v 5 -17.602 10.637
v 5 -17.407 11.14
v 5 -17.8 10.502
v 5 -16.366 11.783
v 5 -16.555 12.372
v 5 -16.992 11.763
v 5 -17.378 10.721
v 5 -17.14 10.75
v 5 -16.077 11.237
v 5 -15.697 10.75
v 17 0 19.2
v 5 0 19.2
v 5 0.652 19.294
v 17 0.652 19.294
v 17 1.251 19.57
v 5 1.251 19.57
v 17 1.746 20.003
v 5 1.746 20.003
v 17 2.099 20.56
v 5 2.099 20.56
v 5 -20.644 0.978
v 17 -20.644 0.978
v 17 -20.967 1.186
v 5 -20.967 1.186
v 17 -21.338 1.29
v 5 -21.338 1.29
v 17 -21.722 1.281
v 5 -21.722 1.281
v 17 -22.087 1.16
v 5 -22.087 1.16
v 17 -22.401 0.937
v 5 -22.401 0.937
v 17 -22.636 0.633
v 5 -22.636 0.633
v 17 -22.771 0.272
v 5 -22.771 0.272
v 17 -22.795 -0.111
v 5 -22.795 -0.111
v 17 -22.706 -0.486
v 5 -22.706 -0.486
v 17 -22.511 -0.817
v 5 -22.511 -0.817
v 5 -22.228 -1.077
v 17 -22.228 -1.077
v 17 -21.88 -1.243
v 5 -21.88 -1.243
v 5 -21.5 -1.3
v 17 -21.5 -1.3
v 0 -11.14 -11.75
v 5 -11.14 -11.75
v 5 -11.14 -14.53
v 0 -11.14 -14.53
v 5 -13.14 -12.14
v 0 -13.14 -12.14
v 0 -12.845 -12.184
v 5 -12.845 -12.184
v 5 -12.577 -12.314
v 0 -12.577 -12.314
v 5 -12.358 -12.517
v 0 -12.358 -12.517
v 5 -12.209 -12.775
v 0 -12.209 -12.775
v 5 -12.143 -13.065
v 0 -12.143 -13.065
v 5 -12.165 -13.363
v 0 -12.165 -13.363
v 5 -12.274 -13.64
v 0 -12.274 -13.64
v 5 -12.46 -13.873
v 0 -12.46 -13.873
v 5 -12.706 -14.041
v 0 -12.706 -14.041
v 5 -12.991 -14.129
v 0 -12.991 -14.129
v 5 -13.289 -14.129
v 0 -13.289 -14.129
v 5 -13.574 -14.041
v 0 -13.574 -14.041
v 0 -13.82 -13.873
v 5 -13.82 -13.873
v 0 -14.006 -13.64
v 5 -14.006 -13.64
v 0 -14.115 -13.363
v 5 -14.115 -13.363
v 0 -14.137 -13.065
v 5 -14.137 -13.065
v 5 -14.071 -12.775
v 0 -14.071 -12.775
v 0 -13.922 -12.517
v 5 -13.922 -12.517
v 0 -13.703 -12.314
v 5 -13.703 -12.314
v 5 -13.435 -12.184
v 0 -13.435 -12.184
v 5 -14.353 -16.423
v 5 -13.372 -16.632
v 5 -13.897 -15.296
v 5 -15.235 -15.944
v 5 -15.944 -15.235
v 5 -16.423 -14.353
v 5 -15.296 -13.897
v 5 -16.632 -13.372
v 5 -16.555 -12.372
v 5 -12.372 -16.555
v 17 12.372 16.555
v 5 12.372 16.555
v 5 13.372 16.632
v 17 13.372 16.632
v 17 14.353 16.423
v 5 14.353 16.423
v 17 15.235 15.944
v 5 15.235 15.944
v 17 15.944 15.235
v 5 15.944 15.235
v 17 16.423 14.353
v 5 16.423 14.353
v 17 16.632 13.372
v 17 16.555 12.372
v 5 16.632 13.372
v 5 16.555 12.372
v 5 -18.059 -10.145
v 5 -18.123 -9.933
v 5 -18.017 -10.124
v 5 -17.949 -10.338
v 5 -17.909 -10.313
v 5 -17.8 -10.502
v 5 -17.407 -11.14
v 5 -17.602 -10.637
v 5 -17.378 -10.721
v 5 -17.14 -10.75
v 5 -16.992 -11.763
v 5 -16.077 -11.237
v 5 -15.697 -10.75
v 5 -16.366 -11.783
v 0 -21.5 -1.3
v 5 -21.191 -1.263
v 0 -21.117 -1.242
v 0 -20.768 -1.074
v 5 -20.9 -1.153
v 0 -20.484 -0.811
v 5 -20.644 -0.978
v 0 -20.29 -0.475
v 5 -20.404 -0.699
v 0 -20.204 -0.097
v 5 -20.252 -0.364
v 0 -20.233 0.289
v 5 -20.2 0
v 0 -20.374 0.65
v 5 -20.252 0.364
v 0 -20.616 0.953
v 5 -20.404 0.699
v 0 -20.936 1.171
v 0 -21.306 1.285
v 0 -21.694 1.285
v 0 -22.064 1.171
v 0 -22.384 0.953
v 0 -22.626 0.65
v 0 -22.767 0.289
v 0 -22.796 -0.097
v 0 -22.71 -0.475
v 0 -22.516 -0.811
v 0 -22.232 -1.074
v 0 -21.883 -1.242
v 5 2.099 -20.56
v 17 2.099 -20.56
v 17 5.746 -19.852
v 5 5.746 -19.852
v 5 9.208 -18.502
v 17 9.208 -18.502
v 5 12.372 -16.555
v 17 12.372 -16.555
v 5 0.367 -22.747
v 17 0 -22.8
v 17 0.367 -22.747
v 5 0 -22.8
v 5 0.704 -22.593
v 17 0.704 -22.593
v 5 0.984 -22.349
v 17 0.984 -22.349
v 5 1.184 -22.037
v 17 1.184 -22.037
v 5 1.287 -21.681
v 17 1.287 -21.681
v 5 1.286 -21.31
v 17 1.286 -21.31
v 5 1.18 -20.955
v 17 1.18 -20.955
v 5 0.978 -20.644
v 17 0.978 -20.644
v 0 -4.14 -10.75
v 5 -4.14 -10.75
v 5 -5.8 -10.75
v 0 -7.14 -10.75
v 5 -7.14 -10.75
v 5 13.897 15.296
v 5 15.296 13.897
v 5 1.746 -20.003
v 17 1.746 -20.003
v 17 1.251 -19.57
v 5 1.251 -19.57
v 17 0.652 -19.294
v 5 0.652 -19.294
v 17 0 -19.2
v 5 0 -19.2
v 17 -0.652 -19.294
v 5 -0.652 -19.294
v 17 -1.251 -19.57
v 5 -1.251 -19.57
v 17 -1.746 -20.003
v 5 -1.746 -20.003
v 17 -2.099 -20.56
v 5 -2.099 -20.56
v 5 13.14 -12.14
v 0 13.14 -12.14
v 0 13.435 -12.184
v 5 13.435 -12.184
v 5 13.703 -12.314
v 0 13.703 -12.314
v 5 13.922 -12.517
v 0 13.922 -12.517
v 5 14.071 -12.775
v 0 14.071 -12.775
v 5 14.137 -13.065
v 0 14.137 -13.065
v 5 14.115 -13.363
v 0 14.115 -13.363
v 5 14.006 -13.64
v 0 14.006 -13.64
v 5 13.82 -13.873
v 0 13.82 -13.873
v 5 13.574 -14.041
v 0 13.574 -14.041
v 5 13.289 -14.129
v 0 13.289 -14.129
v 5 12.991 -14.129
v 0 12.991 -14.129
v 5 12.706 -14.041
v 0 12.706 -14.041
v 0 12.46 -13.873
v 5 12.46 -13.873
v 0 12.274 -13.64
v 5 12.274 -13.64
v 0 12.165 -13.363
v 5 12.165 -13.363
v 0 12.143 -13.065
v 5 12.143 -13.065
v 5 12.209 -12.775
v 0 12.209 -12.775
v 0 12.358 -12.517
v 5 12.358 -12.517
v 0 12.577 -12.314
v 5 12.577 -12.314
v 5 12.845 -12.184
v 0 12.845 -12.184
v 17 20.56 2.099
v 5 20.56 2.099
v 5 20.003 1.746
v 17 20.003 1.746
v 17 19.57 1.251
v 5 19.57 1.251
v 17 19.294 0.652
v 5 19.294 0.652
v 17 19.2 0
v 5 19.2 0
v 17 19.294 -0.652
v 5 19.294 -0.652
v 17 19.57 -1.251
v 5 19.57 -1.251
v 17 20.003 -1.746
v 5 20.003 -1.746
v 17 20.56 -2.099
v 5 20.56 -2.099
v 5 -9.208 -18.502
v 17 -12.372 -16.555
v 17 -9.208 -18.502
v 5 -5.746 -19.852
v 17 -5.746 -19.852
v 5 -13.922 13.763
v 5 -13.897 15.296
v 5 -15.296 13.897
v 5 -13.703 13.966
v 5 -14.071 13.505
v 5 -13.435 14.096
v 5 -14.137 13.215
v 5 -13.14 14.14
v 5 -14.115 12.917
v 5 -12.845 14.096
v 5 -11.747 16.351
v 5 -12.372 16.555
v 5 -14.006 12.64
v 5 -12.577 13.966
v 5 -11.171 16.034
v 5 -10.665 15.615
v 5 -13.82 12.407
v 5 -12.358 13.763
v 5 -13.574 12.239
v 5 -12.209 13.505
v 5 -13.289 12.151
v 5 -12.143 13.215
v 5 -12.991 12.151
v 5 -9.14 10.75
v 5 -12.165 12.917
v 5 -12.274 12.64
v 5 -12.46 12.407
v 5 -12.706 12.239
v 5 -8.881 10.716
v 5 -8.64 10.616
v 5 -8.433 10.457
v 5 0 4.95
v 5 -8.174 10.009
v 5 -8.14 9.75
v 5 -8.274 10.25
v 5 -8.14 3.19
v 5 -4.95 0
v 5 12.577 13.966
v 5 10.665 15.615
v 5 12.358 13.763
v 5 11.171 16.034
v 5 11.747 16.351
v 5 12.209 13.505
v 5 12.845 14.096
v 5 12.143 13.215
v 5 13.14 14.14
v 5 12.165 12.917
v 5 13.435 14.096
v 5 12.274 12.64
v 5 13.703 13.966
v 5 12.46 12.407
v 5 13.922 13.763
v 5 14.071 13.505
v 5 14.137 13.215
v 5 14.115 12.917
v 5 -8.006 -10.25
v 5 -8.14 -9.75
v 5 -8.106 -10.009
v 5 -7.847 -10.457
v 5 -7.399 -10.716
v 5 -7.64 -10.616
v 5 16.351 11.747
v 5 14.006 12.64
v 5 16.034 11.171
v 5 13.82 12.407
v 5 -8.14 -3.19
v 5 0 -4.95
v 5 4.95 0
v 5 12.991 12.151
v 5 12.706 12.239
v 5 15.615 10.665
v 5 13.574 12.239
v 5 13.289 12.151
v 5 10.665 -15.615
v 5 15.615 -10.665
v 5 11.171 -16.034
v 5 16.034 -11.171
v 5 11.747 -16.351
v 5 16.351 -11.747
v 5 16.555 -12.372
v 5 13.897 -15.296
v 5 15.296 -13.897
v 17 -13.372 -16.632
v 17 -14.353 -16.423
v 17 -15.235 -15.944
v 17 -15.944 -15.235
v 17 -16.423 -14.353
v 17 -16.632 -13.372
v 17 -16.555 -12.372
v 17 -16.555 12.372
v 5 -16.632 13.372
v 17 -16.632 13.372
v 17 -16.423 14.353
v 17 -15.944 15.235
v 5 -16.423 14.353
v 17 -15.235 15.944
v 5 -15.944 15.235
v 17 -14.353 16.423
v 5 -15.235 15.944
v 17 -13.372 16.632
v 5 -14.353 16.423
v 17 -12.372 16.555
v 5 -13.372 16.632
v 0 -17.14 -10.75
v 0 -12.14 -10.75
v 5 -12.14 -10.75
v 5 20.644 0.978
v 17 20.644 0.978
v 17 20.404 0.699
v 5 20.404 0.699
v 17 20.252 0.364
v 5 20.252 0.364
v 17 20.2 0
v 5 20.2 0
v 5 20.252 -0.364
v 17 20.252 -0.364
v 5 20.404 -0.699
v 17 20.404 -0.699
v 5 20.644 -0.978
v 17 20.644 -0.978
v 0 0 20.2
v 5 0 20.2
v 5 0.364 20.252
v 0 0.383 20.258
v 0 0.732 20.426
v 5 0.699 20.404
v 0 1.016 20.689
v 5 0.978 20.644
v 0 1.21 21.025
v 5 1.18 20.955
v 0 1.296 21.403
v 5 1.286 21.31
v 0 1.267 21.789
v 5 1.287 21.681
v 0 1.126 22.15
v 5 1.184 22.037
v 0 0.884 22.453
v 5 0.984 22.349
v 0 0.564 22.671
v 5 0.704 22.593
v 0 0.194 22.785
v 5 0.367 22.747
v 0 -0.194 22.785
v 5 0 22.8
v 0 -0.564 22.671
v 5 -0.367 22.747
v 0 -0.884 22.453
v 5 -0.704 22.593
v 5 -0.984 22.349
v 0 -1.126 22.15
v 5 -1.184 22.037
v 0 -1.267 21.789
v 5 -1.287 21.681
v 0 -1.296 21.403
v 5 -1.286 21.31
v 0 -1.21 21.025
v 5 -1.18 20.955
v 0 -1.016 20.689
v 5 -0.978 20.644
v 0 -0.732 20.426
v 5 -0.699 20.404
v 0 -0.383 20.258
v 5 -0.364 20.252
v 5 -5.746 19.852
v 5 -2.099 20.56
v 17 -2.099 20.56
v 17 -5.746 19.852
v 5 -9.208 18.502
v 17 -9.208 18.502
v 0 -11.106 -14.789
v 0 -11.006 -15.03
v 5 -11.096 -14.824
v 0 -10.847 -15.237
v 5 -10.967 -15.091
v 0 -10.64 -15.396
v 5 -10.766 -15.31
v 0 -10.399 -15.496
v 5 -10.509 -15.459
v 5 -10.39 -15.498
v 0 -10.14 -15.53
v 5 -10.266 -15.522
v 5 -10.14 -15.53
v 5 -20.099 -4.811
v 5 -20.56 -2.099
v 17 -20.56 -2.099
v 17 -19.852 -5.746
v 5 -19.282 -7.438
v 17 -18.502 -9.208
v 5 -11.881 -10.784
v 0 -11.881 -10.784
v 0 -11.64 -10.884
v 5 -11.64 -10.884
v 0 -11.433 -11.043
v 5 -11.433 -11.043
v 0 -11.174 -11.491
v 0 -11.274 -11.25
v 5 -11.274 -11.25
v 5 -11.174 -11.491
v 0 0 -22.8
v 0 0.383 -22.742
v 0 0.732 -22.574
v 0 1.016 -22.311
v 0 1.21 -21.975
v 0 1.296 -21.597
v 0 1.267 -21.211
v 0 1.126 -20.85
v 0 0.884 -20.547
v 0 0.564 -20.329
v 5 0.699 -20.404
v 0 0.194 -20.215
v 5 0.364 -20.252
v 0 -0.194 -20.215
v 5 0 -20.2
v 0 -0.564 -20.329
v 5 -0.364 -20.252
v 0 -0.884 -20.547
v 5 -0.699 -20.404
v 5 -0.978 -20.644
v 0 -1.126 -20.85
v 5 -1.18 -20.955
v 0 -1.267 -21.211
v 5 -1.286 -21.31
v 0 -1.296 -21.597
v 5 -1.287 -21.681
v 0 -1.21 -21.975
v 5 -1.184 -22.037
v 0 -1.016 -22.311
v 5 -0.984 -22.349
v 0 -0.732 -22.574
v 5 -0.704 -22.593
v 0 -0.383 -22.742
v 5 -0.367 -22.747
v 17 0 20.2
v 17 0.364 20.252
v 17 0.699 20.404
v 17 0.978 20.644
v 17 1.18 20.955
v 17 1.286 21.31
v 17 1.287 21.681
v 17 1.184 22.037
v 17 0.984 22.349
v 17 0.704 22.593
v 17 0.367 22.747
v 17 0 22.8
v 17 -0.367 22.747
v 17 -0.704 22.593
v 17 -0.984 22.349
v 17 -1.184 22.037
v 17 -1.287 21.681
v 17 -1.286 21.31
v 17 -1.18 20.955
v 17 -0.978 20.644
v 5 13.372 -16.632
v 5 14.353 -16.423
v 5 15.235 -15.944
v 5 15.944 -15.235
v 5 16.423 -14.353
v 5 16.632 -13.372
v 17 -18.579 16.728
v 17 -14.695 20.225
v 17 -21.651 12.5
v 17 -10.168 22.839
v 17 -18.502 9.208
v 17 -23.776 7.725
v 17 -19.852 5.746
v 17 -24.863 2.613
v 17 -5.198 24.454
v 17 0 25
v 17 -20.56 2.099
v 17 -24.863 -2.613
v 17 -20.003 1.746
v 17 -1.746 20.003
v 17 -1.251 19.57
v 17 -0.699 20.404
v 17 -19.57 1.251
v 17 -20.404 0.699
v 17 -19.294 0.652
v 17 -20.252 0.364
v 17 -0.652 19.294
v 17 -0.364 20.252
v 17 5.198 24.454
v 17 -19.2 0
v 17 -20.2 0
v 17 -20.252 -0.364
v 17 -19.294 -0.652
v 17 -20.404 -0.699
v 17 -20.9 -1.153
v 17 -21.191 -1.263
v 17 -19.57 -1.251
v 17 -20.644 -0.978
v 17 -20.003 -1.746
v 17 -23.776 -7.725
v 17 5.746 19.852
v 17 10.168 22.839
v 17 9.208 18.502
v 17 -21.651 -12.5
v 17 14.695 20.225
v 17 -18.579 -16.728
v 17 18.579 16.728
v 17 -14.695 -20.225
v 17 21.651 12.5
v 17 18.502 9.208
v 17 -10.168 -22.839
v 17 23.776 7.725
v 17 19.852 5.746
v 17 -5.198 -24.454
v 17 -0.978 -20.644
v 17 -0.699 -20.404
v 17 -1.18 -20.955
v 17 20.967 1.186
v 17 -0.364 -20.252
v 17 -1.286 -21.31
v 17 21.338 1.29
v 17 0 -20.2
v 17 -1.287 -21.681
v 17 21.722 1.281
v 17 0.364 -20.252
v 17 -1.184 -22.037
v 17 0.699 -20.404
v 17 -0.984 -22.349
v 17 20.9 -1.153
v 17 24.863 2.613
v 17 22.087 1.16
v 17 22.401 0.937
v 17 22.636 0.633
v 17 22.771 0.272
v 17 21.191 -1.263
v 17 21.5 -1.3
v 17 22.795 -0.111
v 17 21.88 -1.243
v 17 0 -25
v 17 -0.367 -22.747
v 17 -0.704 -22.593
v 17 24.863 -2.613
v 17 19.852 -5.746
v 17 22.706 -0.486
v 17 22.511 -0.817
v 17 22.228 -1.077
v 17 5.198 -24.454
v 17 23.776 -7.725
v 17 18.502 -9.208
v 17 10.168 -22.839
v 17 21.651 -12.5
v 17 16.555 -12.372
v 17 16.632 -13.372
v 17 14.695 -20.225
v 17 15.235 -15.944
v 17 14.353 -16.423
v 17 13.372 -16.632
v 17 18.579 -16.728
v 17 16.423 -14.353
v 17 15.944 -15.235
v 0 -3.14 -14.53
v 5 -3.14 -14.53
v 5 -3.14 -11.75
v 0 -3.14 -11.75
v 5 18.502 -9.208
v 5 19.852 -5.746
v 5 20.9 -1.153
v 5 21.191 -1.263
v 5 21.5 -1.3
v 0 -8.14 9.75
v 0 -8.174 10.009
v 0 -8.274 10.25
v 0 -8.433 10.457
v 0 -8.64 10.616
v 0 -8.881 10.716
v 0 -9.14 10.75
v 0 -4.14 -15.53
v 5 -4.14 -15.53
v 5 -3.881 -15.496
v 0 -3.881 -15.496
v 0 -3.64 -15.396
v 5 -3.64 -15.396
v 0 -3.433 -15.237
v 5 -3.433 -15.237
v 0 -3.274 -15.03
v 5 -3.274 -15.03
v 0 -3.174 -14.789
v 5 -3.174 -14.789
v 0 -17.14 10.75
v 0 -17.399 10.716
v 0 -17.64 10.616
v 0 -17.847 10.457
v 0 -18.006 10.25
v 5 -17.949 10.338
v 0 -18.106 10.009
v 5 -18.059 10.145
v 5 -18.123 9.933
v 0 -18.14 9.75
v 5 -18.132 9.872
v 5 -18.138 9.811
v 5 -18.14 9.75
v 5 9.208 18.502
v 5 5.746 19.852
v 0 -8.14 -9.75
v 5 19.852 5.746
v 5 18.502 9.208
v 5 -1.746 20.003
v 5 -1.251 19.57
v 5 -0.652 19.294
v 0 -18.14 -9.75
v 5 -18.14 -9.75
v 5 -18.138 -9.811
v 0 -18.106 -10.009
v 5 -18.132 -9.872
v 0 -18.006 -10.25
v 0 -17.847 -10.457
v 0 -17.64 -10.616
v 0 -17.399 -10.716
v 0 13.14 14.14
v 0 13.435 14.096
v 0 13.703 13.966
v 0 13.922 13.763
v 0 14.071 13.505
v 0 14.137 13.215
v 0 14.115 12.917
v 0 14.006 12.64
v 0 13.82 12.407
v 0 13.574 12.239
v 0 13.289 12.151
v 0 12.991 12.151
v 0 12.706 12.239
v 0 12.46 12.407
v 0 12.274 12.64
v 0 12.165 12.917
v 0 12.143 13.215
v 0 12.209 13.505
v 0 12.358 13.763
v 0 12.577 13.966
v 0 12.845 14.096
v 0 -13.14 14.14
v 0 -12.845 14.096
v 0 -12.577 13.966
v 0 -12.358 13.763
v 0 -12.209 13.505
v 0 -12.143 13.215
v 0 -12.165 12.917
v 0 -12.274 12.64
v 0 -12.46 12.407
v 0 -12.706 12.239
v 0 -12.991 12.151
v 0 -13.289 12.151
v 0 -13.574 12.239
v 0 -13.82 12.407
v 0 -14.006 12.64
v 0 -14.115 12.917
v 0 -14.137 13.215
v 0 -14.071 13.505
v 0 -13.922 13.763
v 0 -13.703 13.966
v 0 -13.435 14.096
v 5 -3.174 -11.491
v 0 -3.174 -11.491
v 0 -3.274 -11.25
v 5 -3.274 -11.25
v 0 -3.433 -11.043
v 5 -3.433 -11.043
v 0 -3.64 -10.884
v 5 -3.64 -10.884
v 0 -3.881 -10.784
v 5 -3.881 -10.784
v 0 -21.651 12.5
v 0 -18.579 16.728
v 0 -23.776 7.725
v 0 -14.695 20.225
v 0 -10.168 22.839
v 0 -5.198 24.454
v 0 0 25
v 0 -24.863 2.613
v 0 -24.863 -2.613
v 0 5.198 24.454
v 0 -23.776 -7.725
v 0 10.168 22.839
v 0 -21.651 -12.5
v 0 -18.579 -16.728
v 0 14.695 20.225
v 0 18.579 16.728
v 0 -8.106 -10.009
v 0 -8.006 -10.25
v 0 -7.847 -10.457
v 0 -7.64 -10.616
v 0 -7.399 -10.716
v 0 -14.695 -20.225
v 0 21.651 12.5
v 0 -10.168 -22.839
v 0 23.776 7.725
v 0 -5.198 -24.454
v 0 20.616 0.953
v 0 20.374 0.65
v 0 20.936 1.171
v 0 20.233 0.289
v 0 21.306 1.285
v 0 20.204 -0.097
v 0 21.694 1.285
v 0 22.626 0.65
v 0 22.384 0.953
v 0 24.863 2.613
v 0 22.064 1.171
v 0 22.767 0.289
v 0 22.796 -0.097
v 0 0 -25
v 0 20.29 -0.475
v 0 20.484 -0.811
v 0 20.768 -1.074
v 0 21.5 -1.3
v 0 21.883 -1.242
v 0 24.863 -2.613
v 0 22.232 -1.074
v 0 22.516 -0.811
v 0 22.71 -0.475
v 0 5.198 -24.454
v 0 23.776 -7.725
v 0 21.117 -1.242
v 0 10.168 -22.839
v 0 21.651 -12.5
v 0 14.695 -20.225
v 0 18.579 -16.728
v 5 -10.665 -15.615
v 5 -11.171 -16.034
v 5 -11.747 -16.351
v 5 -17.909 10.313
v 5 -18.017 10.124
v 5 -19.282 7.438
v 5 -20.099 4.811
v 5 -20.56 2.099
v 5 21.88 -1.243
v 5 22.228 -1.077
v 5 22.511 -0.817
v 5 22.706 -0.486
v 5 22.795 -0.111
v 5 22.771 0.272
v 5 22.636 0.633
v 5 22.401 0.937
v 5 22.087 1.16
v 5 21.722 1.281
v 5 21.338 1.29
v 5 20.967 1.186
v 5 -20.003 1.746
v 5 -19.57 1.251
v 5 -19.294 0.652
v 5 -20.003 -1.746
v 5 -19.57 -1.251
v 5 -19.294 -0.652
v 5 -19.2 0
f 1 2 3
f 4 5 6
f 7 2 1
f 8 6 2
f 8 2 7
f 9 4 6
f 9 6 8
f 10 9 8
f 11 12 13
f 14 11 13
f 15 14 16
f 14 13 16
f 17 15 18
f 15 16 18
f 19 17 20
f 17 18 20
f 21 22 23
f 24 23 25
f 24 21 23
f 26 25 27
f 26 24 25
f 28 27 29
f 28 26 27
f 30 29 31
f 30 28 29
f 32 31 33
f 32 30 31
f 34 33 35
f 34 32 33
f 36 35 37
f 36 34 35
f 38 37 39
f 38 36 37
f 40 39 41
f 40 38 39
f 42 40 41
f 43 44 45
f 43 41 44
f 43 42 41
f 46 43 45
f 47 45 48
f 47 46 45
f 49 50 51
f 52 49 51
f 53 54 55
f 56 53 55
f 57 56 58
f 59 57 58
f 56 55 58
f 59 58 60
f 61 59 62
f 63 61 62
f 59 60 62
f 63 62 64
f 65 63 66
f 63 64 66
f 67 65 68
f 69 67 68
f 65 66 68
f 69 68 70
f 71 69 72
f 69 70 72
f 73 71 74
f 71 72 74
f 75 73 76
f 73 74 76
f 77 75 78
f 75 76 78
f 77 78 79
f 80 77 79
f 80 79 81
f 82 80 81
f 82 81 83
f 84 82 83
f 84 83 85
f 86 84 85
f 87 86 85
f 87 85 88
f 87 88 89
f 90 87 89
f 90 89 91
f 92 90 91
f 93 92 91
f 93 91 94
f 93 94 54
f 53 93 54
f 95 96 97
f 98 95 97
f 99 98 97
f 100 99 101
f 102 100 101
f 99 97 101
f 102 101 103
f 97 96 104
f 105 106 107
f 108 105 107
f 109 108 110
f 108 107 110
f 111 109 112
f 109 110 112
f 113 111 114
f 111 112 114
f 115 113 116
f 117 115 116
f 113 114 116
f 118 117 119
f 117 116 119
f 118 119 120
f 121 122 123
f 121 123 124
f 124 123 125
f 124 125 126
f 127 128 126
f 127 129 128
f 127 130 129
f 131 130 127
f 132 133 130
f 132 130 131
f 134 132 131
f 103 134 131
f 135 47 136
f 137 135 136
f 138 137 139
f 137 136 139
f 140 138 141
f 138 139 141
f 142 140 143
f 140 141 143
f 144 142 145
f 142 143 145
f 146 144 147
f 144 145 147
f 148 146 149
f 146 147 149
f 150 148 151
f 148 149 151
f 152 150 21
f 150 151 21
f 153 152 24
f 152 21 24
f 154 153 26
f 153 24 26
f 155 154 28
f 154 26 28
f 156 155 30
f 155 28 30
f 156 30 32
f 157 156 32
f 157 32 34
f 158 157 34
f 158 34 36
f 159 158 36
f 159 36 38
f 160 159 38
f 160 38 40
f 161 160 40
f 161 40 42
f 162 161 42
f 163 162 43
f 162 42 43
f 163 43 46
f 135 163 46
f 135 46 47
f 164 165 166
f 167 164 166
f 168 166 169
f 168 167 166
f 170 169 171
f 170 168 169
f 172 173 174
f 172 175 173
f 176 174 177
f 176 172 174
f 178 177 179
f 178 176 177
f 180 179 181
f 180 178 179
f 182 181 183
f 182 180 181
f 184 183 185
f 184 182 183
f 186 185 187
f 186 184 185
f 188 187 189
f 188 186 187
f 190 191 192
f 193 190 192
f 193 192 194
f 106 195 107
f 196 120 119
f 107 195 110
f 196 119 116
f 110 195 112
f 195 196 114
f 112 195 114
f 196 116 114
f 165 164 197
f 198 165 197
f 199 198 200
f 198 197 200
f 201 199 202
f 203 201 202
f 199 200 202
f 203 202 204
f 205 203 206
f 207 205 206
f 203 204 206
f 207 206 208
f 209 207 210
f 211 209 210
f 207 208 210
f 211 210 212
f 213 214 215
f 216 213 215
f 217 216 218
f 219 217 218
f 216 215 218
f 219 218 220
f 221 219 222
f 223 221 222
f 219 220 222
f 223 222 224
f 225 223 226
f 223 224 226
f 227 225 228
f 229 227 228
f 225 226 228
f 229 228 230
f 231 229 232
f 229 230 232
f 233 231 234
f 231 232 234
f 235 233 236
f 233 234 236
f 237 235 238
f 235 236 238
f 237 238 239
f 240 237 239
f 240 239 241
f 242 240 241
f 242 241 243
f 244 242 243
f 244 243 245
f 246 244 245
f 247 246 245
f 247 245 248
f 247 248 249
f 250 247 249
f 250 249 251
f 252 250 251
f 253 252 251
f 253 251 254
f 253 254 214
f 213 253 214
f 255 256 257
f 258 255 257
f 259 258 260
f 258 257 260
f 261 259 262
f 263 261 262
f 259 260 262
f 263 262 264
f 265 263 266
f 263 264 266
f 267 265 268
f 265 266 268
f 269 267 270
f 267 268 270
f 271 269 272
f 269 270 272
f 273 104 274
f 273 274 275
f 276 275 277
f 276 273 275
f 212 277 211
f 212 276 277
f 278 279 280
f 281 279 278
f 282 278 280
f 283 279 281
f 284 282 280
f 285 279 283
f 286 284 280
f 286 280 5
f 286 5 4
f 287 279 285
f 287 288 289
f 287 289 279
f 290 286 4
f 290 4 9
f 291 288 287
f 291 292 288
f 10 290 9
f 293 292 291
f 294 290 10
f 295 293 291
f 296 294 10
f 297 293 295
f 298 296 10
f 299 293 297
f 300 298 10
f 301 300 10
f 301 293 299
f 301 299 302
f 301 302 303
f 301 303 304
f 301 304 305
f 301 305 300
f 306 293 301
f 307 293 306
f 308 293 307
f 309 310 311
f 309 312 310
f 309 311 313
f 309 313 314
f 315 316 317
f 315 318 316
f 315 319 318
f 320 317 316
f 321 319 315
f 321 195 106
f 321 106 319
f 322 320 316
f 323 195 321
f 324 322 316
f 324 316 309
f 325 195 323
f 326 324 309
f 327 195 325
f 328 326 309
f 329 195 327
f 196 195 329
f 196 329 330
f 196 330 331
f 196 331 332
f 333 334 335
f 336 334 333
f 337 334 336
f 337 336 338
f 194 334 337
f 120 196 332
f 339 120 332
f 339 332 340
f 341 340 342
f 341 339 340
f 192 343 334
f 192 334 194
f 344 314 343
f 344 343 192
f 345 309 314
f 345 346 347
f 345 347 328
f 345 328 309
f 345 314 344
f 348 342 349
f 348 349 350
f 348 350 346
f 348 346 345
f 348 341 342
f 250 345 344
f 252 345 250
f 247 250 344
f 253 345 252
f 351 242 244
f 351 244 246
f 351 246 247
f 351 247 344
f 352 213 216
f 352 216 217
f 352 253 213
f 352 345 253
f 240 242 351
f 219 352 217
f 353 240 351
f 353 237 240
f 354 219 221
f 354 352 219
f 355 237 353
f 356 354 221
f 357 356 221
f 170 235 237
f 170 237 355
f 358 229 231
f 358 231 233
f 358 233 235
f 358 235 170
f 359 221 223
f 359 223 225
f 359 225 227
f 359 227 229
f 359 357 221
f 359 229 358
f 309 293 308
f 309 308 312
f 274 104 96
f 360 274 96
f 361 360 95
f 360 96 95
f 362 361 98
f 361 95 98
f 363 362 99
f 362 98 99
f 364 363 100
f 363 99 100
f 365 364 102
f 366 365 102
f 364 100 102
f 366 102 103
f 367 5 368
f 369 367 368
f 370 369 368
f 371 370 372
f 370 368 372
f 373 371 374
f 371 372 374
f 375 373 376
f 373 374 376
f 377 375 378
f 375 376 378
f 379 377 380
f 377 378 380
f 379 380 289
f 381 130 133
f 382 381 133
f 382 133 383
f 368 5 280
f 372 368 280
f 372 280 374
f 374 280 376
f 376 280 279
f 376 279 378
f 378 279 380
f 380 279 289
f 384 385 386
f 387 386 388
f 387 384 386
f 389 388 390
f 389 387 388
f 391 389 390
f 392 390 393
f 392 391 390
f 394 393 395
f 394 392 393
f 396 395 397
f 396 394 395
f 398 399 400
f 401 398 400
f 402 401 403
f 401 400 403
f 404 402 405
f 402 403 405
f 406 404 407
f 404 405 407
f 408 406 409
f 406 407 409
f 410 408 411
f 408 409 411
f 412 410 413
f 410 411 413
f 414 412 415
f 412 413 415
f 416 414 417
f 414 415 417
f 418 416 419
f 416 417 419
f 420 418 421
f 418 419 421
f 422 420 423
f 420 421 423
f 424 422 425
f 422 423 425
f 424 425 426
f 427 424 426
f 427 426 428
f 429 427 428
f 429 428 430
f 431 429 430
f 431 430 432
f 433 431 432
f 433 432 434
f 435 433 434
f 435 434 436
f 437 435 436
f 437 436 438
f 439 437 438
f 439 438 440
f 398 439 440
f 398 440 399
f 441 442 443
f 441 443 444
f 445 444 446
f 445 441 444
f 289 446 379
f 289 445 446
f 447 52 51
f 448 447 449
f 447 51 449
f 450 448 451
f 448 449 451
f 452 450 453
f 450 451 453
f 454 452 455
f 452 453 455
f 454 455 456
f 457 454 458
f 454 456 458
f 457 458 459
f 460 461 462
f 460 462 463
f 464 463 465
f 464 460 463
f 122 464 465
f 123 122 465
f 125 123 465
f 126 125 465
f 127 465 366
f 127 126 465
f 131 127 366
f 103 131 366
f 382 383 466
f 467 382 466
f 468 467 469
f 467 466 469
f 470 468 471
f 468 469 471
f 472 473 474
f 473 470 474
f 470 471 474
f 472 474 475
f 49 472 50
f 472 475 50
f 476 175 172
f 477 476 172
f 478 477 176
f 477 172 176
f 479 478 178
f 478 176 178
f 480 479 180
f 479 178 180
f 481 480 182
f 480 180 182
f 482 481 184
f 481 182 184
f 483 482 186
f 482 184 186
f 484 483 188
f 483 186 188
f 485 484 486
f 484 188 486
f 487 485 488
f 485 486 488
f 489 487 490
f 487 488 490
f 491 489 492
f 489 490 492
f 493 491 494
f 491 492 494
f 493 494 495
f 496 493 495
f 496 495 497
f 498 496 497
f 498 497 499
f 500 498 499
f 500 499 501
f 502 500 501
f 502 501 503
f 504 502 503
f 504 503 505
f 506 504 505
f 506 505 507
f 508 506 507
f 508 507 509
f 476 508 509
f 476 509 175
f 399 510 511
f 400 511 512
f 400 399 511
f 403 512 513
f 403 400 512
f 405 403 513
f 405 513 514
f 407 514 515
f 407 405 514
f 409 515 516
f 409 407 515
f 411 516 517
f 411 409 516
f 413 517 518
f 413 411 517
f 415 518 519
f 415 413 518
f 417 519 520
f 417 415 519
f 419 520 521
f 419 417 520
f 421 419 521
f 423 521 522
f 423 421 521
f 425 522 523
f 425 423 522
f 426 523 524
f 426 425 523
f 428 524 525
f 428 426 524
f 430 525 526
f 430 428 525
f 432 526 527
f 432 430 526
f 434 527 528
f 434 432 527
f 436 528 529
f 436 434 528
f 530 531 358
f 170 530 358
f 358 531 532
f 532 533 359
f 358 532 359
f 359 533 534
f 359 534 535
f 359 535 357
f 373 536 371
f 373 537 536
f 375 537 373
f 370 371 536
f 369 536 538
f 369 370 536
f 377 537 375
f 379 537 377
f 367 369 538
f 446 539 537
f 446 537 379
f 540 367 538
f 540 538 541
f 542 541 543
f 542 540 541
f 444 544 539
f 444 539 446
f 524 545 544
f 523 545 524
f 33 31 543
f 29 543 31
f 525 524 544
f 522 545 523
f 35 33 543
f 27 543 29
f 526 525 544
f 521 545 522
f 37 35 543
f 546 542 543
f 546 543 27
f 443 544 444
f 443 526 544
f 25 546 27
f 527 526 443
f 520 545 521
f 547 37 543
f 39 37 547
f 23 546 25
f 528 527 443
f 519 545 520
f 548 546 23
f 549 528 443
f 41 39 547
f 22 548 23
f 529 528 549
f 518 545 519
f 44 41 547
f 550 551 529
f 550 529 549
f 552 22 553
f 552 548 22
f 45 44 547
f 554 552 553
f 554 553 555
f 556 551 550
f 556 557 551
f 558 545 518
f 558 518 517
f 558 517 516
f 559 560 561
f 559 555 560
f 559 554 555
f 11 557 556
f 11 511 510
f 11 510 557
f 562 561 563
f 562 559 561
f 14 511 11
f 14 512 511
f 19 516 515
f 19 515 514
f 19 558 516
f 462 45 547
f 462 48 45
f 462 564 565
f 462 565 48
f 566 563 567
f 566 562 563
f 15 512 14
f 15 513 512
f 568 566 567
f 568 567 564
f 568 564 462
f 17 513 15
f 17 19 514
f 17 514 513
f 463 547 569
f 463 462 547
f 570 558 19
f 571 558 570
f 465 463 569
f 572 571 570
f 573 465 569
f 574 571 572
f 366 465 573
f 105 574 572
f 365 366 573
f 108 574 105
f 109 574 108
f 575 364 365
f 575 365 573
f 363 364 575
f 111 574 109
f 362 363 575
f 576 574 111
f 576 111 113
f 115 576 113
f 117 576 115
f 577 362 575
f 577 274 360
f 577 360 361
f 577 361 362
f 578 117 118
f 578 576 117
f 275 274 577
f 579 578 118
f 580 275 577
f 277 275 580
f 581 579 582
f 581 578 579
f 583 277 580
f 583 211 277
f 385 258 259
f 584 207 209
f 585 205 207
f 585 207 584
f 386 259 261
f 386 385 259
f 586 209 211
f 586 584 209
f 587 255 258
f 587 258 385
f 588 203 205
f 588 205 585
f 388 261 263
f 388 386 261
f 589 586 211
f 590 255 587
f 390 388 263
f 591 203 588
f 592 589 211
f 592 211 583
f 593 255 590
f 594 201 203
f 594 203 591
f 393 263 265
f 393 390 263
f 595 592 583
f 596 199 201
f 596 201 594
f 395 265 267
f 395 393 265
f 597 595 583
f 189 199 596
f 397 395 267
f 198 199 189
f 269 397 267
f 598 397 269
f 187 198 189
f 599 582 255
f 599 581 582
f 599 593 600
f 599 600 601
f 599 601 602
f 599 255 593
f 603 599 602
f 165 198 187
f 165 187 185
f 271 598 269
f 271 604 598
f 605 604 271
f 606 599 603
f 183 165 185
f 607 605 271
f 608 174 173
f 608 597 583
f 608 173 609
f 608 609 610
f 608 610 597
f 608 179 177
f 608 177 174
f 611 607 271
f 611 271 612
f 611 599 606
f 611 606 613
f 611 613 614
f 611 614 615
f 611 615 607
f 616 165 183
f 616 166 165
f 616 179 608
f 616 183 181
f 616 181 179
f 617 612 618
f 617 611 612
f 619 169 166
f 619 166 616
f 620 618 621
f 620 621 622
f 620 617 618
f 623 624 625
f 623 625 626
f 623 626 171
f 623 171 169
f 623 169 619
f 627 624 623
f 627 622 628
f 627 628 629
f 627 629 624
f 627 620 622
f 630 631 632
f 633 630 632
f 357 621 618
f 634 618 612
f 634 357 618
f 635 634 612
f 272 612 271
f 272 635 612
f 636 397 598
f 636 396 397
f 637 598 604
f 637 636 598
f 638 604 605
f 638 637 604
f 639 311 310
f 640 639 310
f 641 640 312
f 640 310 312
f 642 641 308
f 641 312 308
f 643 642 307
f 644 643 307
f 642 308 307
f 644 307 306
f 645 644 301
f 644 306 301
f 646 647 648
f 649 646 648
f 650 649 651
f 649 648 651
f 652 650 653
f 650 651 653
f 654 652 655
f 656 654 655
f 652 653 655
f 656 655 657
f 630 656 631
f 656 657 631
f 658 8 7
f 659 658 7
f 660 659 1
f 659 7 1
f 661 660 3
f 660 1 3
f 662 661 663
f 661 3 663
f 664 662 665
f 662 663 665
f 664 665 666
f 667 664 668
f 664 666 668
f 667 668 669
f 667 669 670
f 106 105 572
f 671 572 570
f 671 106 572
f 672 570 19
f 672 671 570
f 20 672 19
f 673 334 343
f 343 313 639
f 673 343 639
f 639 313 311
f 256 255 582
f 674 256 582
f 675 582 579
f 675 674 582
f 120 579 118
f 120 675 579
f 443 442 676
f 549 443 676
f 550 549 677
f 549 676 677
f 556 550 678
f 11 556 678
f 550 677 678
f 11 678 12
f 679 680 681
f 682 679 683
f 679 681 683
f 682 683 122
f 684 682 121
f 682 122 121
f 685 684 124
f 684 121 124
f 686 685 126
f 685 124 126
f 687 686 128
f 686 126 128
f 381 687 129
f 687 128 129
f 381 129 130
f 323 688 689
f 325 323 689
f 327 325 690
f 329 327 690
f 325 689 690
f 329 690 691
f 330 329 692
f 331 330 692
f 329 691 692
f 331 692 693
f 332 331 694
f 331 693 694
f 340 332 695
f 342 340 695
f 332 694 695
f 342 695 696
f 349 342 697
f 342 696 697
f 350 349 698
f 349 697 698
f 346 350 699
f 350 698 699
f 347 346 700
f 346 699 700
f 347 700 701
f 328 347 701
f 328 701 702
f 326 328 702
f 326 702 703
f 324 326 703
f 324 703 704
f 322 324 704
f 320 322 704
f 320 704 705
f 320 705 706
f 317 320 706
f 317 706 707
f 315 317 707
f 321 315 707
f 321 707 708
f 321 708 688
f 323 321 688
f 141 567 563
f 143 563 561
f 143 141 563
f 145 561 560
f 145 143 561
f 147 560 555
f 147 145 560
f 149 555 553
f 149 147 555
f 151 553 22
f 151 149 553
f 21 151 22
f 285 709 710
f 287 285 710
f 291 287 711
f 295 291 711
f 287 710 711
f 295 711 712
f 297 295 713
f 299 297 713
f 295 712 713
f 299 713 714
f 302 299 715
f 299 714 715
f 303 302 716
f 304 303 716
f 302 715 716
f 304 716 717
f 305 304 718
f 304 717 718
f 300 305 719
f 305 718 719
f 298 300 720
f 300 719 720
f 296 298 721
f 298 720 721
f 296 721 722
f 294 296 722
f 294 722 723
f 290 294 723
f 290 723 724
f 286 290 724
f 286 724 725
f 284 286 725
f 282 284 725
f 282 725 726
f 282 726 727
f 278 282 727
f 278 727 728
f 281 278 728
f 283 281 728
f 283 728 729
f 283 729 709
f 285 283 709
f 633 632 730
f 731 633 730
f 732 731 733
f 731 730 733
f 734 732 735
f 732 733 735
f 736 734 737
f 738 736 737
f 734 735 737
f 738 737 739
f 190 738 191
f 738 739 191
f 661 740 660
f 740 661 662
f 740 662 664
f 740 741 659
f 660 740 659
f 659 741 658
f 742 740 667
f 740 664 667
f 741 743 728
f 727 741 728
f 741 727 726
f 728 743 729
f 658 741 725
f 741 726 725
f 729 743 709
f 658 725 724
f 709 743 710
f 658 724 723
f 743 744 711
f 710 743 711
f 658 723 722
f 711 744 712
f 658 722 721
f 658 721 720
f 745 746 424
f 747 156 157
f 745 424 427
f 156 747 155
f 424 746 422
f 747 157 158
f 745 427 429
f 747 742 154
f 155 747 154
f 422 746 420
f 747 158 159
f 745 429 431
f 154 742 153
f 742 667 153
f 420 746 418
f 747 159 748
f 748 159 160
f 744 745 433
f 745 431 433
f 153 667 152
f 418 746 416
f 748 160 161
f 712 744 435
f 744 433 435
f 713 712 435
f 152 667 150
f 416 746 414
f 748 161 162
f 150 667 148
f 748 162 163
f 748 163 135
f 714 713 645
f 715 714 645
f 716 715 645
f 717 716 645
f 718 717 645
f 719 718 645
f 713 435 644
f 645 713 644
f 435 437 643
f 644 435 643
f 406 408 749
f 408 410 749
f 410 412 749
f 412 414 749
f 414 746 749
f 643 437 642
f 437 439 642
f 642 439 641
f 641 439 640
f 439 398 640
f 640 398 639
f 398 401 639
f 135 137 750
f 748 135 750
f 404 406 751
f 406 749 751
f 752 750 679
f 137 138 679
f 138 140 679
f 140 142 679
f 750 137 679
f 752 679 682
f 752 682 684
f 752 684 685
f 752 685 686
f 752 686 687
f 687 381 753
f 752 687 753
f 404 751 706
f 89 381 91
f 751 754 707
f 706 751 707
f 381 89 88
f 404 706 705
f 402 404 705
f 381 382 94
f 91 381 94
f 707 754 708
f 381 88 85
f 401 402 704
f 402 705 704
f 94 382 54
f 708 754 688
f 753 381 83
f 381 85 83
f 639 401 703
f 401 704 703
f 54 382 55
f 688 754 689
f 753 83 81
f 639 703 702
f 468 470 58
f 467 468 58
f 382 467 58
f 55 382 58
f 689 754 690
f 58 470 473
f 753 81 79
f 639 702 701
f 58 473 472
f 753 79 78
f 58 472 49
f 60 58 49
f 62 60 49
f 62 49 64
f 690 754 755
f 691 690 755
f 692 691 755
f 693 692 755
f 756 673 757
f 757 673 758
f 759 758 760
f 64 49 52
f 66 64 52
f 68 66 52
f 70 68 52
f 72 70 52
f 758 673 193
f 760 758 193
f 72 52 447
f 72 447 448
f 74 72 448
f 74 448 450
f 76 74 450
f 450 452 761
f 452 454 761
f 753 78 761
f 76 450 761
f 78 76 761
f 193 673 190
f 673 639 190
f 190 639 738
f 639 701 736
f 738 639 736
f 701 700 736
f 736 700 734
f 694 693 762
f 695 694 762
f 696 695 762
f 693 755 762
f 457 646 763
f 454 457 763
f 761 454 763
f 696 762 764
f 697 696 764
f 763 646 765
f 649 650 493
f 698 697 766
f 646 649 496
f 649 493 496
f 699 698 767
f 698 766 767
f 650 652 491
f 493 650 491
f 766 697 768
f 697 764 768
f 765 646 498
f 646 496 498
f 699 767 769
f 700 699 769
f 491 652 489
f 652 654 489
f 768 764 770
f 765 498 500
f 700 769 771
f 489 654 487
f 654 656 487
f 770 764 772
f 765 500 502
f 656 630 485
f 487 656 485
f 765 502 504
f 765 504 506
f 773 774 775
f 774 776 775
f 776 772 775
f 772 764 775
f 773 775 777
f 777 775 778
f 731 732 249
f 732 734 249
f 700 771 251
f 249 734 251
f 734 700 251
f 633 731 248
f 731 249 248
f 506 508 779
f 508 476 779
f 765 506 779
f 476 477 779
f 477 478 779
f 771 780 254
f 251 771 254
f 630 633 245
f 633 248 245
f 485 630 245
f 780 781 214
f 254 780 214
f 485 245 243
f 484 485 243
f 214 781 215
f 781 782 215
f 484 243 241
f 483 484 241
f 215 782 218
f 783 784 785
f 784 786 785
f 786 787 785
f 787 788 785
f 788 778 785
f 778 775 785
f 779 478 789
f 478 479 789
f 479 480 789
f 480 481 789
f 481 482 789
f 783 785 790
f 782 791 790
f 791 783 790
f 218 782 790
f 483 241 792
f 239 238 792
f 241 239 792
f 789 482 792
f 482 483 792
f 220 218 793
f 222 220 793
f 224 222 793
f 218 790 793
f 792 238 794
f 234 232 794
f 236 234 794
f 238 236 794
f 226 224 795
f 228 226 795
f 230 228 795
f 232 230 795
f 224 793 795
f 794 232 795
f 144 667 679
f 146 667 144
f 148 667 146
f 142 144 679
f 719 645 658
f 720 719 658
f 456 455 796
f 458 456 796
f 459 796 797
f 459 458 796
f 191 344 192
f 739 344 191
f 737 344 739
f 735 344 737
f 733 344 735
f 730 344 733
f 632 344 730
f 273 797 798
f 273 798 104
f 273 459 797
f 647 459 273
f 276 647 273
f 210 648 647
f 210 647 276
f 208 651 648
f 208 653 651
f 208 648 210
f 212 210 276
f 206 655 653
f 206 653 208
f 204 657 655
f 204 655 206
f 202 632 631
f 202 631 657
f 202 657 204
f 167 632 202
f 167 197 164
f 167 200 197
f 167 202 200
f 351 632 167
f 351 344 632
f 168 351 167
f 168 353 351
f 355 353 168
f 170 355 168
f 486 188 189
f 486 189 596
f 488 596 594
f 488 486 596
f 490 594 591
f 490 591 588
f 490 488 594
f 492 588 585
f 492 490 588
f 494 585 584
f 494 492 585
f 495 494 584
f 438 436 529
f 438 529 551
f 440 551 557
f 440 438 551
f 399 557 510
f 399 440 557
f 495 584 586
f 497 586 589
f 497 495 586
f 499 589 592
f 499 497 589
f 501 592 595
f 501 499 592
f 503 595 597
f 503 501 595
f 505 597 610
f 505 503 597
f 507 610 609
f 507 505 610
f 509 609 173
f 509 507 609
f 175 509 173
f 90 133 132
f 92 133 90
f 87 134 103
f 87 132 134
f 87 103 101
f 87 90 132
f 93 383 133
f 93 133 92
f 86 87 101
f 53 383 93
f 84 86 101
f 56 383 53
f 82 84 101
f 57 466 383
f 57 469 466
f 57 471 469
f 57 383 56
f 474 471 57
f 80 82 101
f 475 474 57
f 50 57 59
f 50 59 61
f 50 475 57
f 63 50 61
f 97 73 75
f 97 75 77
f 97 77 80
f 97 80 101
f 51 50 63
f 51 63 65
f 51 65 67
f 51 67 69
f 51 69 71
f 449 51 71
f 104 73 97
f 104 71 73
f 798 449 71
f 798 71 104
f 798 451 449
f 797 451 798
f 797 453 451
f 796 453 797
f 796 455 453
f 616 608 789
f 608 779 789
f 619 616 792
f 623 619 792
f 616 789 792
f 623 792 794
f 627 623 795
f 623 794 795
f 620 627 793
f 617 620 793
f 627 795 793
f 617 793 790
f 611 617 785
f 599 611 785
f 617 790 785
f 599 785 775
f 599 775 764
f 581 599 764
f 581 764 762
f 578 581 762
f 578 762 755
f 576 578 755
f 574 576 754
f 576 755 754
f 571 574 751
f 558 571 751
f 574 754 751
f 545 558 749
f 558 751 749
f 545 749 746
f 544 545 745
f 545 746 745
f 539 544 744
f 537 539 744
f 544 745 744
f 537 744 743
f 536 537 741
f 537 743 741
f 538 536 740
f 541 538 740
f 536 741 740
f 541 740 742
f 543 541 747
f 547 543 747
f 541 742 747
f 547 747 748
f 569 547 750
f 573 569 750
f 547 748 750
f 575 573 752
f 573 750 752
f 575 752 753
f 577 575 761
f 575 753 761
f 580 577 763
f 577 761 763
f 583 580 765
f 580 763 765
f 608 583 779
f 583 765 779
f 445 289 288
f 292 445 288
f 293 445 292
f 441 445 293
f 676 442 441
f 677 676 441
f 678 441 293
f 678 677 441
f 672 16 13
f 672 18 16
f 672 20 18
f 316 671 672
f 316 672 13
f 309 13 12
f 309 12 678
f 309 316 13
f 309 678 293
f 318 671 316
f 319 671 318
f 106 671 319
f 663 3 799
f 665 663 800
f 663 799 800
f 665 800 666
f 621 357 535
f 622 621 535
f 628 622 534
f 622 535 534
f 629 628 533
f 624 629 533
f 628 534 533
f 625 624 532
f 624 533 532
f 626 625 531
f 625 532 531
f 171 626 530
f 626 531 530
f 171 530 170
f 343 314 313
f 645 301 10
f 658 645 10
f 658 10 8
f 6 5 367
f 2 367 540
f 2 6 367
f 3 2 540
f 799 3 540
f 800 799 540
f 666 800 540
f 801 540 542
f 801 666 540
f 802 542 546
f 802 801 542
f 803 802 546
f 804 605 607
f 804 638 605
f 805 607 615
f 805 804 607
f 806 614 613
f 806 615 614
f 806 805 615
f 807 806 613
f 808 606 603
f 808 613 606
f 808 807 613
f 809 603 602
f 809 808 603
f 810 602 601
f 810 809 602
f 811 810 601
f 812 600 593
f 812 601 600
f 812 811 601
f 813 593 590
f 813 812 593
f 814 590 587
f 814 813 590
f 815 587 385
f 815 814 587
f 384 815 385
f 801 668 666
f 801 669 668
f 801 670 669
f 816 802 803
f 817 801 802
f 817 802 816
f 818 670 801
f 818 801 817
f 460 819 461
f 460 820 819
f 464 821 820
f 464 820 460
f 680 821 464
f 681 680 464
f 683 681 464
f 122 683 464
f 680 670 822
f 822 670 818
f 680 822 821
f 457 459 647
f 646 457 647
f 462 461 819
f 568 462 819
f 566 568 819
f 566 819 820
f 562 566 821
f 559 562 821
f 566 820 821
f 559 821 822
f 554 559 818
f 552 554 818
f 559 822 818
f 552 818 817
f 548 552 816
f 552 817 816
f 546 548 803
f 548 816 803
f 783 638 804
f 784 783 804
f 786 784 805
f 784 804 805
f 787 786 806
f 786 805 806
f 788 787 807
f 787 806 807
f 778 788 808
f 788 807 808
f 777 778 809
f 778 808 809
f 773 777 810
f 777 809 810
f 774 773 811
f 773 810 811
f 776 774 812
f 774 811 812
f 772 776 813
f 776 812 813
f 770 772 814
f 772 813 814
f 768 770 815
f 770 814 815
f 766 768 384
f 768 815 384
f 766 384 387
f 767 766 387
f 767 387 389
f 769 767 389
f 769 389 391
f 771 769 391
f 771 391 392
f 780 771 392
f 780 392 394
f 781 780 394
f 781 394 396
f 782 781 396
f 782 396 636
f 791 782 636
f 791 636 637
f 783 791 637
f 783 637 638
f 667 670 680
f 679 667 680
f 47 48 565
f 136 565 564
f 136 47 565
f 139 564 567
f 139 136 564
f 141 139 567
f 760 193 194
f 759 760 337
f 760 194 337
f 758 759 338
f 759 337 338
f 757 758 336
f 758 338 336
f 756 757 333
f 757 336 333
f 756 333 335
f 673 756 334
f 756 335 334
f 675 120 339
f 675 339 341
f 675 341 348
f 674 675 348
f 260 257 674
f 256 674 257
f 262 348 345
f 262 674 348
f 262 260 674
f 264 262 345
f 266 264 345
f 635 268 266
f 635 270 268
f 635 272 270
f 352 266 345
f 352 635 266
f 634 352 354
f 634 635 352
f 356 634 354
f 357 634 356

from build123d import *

# Parameters (mm, degrees)
SKETCH1_R               = 25
BOSS_EXTRUDE1_DEPTH     = 5
SKETCH3_R               = 1
CUT_EXTRUDE2_DEPTH      = 6
SKETCH4_R               = 25
SKETCH4_R_2             = 20.666666667
BOSS_EXTRUDE2_DEPTH     = 12
SKETCH2_R               = 1.3
CUT_EXTRUDE1_DEPTH      = 13
CUT_EXTRUDE1_DEPTH_BACK = 6
CUT_EXTRUDE3_DEPTH      = 6
CUT_EXTRUDE5_DEPTH      = 13
SKETCH8_R               = 2.3
SKETCH8_R_2             = 1.3
BOSS_EXTRUDE3_DEPTH     = 12


with BuildPart() as part:
    # Sketch1 → Boss-Extrude1 (new body)
    with BuildSketch(Plane(origin=(0, 0, 0), x_dir=(0, 0, -1), z_dir=(1, 0, 0))):
        Circle(SKETCH1_R)
    extrude(amount=BOSS_EXTRUDE1_DEPTH)

    # Sketch3 → Cut-Extrude2 (cut, through all)
    with BuildSketch(Plane.ZY):
        with Locations((-13.14, 13.14)):
            Circle(SKETCH3_R)
        with Locations((13.14, 13.14)):
            Circle(SKETCH3_R)
        with Locations((13.14, -13.14)):
            Circle(SKETCH3_R)
        with Locations((-13.14, -13.14)):
            Circle(SKETCH3_R)
    extrude(amount=-CUT_EXTRUDE2_DEPTH, mode=Mode.SUBTRACT)

    # Sketch4 → Boss-Extrude2 (add)
    with BuildSketch(Plane(origin=(5, 0, 0), x_dir=(0, 0, -1), z_dir=(1, 0, 0))):
        Circle(SKETCH4_R)
        Circle(SKETCH4_R_2, mode=Mode.SUBTRACT)
    extrude(amount=BOSS_EXTRUDE2_DEPTH)

    # Sketch2 → Cut-Extrude1 (cut, two sides)
    with BuildSketch(Plane(origin=(5, 0, 0), x_dir=(0, 0, -1), z_dir=(1, 0, 0))) as cut_extrude1_sk:
        with Locations((0, 21.5)):
            Circle(SKETCH2_R)
        with Locations((21.5, 0)):
            Circle(SKETCH2_R)
        with Locations((0, -21.5)):
            Circle(SKETCH2_R)
        with Locations((-21.5, 0)):
            Circle(SKETCH2_R)
    extrude(amount=CUT_EXTRUDE1_DEPTH, mode=Mode.SUBTRACT)
    extrude(cut_extrude1_sk.sketch, amount=-CUT_EXTRUDE1_DEPTH_BACK, mode=Mode.SUBTRACT)

    # Sketch5 → Cut-Extrude3 (cut, through all)
    with BuildSketch(Plane(origin=(5, 0, 0), x_dir=(0, 0, -1), z_dir=(1, 0, 0))):
        with BuildLine():
            Line((9.75, -8.14), (-9.75, -8.14))
            ThreePointArc((-9.75, -8.14), (-10.457106781, -8.432893219), (-10.75, -9.14))
            Line((-10.75, -9.14), (-10.75, -17.14))
            ThreePointArc((-10.75, -17.14), (-10.457106781, -17.847106781), (-9.75, -18.14))
            Line((-9.75, -18.14), (9.75, -18.14))
            ThreePointArc((9.75, -18.14), (10.457106781, -17.847106781), (10.75, -17.14))
            Line((10.75, -17.14), (10.75, -12.14))
            ThreePointArc((10.75, -12.14), (11.042893219, -11.432893219), (11.75, -11.14))
            Line((11.75, -11.14), (14.53, -11.14))
            ThreePointArc((14.53, -11.14), (15.237106781, -10.847106781), (15.53, -10.14))
            Line((15.53, -10.14), (15.53, -4.14))
            ThreePointArc((15.53, -4.14), (15.237106781, -3.432893219), (14.53, -3.14))
            Line((14.53, -3.14), (11.75, -3.14))
            ThreePointArc((11.75, -3.14), (11.042893219, -3.432893219), (10.75, -4.14))
            Line((10.75, -4.14), (10.75, -7.14))
            ThreePointArc((10.75, -7.14), (10.457106781, -7.847106781), (9.75, -8.14))
        make_face()
    extrude(amount=-CUT_EXTRUDE3_DEPTH, mode=Mode.SUBTRACT)

    # Sketch7 → Cut-Extrude5 (cut, through all)
    with BuildSketch(Plane(origin=(5, 0, 0), x_dir=(0, 0, -1), z_dir=(1, 0, 0))):
        with BuildLine():
            Line((-10.665126266, 15.614873734), (0, 4.949747468))
            Line((0, 4.949747468), (10.665126266, 15.614873734))
            ThreePointArc((10.665126266, 15.614873734), (15.614873734, 15.614873734), (15.614873734, 10.665126266))
            Line((15.614873734, 10.665126266), (4.949747468, 0))
            Line((4.949747468, 0), (15.614873734, -10.665126266))
            ThreePointArc((15.614873734, -10.665126266), (15.614873734, -15.614873734), (10.665126266, -15.614873734))
            Line((10.665126266, -15.614873734), (0, -4.949747468))
            Line((0, -4.949747468), (-10.665126266, -15.614873734))
            ThreePointArc((-10.665126266, -15.614873734), (-15.614873734, -15.614873734), (-15.614873734, -10.665126266))
            Line((-15.614873734, -10.665126266), (-4.949747468, 0))
            Line((-4.949747468, 0), (-15.614873734, 10.665126266))
            ThreePointArc((-15.614873734, 10.665126266), (-15.614873734, 15.614873734), (-10.665126266, 15.614873734))
        make_face()
    extrude(amount=CUT_EXTRUDE5_DEPTH, mode=Mode.SUBTRACT)

    # Sketch8 → Boss-Extrude3 (add)
    with BuildSketch(Plane(origin=(5, 0, 0), x_dir=(0, 0, -1), z_dir=(1, 0, 0))):
        with Locations((0, -21.5)):
            Circle(SKETCH8_R)
        with Locations((0, -21.5)):
            Circle(SKETCH8_R_2, mode=Mode.SUBTRACT)
        with Locations((-21.5, 0)):
            Circle(SKETCH8_R)
        with Locations((-21.5, 0)):
            Circle(SKETCH8_R_2, mode=Mode.SUBTRACT)
        with Locations((0, 21.5)):
            Circle(SKETCH8_R)
        with Locations((0, 21.5)):
            Circle(SKETCH8_R_2, mode=Mode.SUBTRACT)
        with Locations((21.5, 0)):
            Circle(SKETCH8_R)
        with Locations((21.5, 0)):
            Circle(SKETCH8_R_2, mode=Mode.SUBTRACT)
    extrude(amount=BOSS_EXTRUDE3_DEPTH)


solid = part.part
